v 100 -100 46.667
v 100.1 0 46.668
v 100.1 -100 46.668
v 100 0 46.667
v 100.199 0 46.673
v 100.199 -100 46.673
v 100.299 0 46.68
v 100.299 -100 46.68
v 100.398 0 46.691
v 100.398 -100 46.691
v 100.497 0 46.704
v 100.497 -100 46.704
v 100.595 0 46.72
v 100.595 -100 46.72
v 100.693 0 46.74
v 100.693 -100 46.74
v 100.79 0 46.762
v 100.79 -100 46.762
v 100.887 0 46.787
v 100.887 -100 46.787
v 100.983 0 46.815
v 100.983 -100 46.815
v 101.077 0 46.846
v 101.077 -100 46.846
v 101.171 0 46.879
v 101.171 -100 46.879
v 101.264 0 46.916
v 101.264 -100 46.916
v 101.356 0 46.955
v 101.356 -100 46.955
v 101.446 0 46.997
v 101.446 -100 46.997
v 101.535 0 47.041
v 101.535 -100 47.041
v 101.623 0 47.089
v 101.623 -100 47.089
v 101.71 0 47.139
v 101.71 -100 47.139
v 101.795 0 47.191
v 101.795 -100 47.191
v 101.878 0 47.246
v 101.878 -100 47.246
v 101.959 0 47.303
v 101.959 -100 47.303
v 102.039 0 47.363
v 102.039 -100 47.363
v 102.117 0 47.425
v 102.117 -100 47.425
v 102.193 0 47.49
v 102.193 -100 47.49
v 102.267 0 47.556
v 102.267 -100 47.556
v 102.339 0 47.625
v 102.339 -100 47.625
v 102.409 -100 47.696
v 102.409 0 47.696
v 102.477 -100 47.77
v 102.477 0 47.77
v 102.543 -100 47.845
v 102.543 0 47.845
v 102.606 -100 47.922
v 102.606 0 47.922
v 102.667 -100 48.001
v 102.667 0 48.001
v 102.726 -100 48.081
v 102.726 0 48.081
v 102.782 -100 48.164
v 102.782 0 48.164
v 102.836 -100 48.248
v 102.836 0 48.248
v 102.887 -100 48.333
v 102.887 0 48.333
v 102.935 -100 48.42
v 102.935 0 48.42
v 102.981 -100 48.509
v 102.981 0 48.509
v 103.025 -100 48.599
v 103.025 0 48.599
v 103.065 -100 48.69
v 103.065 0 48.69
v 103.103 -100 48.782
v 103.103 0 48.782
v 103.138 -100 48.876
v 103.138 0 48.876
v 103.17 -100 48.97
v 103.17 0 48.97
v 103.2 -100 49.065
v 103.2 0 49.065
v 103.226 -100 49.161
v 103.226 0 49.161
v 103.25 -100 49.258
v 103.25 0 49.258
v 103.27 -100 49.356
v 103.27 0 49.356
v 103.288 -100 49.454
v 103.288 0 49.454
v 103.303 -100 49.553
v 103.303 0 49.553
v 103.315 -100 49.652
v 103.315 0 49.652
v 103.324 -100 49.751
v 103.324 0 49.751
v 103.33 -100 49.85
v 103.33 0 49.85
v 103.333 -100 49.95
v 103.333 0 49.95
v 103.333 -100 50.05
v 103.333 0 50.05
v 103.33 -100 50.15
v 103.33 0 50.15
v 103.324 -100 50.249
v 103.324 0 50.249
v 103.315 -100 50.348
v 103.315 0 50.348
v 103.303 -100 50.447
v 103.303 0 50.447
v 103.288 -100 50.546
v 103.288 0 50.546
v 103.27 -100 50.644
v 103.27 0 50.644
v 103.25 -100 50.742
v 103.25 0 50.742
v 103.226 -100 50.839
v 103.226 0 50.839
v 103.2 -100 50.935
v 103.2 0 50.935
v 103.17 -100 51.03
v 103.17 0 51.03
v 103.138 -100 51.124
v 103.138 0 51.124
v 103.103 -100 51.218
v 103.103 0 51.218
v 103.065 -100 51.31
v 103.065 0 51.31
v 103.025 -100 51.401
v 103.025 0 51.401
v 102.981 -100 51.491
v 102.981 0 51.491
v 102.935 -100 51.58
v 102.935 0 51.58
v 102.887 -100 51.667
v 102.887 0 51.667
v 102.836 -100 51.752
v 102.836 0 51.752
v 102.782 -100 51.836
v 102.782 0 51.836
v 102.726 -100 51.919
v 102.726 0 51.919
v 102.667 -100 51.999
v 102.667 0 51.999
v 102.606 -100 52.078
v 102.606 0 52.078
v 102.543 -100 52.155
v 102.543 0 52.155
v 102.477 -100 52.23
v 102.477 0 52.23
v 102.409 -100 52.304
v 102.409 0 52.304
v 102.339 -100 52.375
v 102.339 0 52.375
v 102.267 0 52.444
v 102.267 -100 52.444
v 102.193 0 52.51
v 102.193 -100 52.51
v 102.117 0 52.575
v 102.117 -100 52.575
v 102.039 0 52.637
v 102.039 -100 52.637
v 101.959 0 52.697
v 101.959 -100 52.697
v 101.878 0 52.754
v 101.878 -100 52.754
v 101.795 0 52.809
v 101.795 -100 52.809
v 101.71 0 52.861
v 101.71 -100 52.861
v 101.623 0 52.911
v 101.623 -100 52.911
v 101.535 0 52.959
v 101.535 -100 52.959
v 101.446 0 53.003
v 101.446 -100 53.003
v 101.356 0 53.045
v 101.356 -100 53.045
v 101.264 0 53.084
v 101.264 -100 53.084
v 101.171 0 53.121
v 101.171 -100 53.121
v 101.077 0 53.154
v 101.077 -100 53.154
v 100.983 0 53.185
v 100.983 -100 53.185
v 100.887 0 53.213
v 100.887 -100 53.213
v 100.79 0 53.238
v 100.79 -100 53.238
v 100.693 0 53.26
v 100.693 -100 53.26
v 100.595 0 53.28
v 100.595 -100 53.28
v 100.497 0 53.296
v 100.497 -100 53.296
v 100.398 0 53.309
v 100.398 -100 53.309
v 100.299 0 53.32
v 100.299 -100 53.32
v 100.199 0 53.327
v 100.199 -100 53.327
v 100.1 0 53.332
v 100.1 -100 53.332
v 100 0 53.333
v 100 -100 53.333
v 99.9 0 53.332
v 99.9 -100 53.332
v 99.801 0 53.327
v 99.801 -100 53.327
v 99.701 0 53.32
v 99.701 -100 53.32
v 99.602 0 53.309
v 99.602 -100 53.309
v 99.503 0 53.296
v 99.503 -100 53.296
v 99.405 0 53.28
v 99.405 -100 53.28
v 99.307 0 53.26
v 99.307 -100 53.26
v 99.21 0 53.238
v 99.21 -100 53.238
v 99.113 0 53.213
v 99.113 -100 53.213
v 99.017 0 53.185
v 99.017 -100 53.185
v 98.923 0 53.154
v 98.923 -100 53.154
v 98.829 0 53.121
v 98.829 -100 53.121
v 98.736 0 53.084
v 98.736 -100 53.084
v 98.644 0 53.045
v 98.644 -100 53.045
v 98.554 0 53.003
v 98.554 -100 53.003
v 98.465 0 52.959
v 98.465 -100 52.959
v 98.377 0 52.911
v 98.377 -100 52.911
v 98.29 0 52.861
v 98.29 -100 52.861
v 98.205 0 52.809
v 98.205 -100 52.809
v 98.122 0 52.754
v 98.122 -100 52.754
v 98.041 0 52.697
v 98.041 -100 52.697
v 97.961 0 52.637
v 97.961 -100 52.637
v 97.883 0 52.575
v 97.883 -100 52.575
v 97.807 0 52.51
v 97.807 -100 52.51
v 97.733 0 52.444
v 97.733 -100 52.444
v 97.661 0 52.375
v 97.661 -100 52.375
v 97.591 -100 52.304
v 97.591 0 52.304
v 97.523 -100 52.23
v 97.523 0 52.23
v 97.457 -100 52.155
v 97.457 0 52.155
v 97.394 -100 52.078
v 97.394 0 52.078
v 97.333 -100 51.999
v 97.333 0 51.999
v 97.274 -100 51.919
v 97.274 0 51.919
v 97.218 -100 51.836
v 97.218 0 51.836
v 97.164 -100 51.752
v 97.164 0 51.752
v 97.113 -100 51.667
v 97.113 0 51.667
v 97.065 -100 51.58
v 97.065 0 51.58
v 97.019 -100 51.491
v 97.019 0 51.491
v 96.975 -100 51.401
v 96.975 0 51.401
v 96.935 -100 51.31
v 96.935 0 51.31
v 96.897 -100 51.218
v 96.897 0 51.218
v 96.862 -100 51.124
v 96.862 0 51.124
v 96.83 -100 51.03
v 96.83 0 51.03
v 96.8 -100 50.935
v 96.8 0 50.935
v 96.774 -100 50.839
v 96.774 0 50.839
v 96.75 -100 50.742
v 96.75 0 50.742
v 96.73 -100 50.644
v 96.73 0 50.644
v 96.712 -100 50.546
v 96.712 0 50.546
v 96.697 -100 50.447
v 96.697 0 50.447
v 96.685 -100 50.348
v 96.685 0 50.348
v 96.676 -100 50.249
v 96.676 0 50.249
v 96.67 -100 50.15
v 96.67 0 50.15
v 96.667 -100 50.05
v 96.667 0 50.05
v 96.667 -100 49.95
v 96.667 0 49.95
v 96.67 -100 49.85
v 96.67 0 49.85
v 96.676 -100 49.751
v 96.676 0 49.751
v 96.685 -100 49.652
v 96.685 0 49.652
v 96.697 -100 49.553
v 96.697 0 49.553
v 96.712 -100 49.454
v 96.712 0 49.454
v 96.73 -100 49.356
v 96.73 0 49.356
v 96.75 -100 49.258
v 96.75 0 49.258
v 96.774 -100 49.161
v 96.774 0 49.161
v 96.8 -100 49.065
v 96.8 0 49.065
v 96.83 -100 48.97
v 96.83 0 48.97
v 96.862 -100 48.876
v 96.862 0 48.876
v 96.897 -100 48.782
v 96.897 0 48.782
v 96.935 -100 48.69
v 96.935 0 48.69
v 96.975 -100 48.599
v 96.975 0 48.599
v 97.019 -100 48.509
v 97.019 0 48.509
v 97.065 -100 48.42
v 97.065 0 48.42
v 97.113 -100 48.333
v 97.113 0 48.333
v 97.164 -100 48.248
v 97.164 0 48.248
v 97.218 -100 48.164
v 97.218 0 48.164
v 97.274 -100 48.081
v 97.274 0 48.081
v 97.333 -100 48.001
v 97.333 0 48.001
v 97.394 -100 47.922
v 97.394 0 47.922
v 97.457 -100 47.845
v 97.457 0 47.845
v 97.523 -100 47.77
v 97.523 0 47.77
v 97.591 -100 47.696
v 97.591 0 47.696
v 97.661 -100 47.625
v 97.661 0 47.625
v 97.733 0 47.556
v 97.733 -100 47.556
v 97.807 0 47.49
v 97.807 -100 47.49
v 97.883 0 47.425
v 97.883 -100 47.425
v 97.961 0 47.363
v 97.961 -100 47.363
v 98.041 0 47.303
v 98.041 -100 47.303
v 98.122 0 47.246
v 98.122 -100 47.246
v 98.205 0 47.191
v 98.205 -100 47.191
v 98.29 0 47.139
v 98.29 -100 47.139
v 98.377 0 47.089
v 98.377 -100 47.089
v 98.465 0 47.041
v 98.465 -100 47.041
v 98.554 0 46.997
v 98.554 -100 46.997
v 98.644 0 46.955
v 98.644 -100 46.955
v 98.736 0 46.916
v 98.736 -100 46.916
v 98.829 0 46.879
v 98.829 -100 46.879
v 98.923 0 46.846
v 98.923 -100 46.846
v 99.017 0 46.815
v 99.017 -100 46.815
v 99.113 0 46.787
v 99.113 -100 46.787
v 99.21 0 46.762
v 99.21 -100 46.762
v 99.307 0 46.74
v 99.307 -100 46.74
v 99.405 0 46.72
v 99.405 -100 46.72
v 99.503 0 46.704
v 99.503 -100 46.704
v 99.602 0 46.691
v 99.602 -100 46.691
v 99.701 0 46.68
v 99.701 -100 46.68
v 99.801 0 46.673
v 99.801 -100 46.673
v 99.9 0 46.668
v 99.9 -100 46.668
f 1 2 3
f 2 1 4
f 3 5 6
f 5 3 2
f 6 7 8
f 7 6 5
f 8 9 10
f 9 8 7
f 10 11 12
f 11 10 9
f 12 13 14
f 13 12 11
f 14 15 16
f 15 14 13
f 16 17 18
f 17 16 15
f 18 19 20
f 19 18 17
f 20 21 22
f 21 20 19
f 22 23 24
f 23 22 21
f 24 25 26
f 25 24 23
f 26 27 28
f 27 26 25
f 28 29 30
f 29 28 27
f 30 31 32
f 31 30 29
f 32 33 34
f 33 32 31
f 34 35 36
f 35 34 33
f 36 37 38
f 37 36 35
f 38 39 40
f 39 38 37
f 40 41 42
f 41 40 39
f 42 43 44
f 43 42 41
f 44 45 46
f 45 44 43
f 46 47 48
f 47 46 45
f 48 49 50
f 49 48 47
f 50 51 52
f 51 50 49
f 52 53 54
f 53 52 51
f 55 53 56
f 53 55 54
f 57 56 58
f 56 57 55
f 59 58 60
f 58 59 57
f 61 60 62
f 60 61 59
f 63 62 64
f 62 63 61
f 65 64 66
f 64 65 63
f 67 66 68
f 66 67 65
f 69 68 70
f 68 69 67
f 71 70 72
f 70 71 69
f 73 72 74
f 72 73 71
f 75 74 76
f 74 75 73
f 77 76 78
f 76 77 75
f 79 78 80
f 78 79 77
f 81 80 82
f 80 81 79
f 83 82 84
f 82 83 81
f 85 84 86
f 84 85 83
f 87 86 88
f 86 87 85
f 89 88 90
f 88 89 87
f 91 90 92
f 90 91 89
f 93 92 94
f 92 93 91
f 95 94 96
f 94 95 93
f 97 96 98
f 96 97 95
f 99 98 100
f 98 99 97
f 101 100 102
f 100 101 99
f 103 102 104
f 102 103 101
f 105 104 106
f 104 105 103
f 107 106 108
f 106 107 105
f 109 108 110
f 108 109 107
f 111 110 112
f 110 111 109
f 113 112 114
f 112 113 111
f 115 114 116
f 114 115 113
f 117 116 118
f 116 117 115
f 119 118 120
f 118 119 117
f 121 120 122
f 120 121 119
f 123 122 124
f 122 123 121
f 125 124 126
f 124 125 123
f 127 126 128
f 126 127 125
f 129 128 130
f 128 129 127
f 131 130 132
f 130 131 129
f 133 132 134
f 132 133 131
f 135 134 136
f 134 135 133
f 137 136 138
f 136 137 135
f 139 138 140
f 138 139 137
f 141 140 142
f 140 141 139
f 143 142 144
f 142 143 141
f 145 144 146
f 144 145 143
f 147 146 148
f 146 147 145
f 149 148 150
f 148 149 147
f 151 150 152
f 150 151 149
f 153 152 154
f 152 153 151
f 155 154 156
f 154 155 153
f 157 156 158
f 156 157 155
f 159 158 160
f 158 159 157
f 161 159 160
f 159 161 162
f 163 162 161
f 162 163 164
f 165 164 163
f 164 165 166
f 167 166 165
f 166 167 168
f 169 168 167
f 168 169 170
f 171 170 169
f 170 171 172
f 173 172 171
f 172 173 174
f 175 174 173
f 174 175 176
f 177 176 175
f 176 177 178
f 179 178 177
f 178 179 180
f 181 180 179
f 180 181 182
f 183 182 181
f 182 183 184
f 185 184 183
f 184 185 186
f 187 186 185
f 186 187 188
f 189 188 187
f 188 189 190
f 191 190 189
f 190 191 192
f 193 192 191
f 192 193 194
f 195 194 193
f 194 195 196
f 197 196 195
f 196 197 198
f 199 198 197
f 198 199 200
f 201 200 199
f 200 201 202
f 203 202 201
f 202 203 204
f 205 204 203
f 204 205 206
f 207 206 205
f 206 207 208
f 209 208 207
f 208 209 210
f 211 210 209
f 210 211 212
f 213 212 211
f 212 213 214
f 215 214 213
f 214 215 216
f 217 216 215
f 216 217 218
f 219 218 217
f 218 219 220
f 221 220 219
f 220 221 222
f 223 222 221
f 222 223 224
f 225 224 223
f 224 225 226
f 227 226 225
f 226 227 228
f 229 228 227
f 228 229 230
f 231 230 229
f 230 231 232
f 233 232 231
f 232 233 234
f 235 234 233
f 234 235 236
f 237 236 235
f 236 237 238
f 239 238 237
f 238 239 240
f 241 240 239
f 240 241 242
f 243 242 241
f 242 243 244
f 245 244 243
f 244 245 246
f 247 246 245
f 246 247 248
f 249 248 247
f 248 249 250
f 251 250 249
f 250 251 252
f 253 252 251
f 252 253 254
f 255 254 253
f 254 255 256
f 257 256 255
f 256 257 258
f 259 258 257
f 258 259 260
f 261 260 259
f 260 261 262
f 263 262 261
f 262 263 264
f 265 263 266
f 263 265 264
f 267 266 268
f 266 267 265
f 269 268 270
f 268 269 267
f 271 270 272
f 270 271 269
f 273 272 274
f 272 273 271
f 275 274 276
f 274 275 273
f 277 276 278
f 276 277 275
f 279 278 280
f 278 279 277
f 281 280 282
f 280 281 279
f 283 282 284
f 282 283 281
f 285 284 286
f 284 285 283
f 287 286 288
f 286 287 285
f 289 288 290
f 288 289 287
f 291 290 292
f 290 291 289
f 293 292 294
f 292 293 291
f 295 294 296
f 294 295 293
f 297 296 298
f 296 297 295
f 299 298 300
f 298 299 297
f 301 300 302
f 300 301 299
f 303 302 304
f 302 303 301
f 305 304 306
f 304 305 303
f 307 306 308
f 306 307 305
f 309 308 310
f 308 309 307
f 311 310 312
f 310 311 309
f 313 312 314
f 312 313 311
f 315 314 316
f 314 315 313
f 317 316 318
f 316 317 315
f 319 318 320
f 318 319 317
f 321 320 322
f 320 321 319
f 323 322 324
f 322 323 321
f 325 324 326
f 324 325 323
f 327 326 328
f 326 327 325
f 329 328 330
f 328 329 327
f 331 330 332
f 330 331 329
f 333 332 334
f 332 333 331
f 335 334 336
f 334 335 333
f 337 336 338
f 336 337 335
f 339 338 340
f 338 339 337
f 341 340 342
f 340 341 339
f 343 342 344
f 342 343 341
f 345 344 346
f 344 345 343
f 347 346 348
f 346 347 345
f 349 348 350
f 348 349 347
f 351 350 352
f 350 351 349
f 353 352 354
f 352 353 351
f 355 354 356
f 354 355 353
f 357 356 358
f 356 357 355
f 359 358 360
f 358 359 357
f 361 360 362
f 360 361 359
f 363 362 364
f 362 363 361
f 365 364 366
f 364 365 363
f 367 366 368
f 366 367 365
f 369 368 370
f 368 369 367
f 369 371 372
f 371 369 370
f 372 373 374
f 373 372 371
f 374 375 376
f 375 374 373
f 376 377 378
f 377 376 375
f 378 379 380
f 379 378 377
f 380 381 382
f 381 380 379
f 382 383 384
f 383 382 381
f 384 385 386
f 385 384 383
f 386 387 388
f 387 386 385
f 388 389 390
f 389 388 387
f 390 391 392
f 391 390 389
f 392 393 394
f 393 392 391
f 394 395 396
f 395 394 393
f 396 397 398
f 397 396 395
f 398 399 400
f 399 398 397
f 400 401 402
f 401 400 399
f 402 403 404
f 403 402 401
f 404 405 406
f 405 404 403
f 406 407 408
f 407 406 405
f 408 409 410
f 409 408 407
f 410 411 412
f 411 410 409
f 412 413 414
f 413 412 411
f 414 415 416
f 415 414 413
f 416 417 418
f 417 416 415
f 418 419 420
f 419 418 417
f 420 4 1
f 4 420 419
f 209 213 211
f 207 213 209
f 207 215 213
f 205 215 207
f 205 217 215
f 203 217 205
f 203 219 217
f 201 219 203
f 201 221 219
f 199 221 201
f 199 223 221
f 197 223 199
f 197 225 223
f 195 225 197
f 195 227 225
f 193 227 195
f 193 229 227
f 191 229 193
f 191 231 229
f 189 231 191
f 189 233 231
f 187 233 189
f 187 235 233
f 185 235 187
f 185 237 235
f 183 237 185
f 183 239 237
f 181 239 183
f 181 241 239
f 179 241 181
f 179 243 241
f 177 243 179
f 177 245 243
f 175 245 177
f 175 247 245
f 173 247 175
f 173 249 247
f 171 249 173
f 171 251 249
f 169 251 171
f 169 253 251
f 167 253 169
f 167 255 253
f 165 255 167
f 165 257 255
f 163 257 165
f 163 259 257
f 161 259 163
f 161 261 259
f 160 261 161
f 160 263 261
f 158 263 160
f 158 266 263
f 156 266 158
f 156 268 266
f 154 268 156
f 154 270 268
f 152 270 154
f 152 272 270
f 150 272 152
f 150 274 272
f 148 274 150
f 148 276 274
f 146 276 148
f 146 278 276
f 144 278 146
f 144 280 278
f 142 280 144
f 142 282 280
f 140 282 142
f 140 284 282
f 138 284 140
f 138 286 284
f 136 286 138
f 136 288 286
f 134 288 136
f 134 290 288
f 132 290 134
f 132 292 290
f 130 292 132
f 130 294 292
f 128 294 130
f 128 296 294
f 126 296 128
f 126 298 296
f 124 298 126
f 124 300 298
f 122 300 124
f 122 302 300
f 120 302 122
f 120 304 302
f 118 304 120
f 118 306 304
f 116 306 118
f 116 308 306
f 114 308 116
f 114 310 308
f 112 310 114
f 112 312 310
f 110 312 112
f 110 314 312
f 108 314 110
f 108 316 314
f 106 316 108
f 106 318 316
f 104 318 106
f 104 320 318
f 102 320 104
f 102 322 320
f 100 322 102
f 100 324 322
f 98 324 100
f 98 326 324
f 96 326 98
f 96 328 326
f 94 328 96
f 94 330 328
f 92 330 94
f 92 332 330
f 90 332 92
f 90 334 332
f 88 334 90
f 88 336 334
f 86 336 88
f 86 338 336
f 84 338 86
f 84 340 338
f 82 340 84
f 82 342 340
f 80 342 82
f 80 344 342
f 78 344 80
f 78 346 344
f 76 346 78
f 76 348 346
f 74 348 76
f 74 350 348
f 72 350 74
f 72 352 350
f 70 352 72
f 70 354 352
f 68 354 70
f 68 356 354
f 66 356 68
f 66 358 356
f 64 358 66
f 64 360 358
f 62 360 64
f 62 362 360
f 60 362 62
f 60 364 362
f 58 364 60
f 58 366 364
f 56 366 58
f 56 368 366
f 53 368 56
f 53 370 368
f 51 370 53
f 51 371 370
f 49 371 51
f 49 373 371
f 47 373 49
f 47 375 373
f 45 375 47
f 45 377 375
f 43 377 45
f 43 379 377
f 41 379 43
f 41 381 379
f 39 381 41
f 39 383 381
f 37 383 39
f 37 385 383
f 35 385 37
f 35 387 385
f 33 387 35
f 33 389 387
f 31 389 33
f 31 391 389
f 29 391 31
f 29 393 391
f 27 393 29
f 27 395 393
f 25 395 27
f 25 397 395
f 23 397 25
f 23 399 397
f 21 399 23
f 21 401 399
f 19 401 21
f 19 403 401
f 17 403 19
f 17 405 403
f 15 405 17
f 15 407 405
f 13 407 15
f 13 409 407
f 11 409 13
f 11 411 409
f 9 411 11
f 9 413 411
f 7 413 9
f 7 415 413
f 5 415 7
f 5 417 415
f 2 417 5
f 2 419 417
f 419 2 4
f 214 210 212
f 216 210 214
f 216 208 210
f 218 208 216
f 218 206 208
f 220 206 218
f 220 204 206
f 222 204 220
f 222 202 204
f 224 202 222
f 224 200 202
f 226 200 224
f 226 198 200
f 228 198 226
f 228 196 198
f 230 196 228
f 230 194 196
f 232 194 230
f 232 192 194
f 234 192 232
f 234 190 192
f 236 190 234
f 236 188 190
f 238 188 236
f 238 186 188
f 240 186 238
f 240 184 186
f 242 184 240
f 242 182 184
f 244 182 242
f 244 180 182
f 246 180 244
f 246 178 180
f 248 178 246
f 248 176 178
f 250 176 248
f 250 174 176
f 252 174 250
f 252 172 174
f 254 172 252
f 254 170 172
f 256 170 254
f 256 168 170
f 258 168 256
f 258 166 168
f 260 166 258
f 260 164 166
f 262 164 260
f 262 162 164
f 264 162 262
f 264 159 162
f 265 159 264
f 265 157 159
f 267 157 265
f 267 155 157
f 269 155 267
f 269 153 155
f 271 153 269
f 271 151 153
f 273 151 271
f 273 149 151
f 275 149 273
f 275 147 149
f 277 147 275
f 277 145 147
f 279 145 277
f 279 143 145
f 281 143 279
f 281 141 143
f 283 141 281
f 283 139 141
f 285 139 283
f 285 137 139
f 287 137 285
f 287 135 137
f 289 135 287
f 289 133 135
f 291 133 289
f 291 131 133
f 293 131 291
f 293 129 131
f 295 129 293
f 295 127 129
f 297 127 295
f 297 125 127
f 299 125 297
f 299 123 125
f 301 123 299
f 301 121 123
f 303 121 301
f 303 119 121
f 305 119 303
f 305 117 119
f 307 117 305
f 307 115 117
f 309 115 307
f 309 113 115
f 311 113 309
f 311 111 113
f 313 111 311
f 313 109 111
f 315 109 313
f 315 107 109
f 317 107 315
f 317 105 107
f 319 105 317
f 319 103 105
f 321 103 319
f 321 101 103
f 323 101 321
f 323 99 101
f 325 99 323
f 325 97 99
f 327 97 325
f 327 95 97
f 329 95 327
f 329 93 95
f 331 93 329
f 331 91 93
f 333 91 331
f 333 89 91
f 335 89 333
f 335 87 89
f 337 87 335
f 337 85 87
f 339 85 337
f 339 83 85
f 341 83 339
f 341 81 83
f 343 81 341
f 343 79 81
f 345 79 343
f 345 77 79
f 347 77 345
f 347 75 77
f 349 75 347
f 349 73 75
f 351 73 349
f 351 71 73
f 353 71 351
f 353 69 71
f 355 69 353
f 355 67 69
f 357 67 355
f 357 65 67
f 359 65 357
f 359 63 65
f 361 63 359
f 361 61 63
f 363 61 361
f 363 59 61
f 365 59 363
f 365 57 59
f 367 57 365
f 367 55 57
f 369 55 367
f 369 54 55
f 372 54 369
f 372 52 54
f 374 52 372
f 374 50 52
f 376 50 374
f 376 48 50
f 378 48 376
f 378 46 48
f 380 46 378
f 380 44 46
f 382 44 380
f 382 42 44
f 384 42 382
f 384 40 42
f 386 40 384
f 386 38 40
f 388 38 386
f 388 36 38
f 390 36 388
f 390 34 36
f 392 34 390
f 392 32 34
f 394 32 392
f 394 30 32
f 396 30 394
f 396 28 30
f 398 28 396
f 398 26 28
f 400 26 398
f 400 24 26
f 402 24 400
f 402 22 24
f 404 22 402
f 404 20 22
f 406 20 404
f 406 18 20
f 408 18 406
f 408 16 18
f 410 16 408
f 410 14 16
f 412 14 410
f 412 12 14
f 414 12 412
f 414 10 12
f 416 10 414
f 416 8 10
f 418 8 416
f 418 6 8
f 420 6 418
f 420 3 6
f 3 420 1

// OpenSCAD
// file: Part-Constants.scad
// PART CONSTANT Configuration File
//  last modified June 8 2021 by SrAmo

// conversions
mm_inch = 1/25.4;

// 1/4 ID bearing OD if using a bearing (PART FR4-ZZ C3)
bearing_od=15.9512; // 0.628 inch = 15.9512 mm
// 1/4 ID bearing flange OD (with clearance)
bearing_flange_od=18.034; // .71 inch = 18.034 mm
// 1/4 ID bearing flange thickness
bearing_flange_t=1.27; // 0.05 inch = 1.27 mm
// 1/4 ID bearing thickness (under the flange)
bearing_t=3.937; // 0.155 inch = 3.937 mm

// round belt diameter throughout, if used
//belt_d=4.826;   // 0.19 in = 4.826 mm

// hole for 0.25 inch joint/bolt
hole_p25_inch=6.477;   // 0.255 inch = 6.477 mm
// hole start diameter for number 6 screw
hole_no6_screw = 2.413; // 0.095 inch = 2.413
// hole for M3 (3 mm) joint/bolt
hole_M3=3.1;  // inch
// hole for M5 (5 mm) joint/bolt
hole_M5=5.1;  // inch
// hole for servo bushing
hole_servo_bushing=3.81;   // 0.15 inch = 3.81 mm

// STANDARD 40MM X 20MM X 40MM SERVO DIMENSIONS
// Servo Length for openings in parts
svo_l = 40.66; 
// Servo Width for openings in parts
svo_w = 20.3;
// Servo Depth from Horn interface to bottom of part
svo_d = 42;
// Servo dist from shaft to edge of body in length direction
svo_shaft = 10.2;
// Servo screw hole length between
svo_screw_l = 49.5;
// Servo screw hole width between
svo_screw_w = 10;
// Servo flange length
svo_flange_l = 55;
// Servo flange thickness
svo_flange_t = 3;
// Servo depth from Horn interface to top of flange
svo_flange_d = 10;

GT2pulleyd = 12;
GT2pulleyt = 8.5;
// file: Pulley-GT2_2.scad
// Parametric Pulley for GT2-2 belt profiles
// by droftarts January 2012
// Modified to parametric GT2-2 module by SrAmo May-Aug 2020
// Based on pulleys by:
// http://www.thingiverse.com/thing:11256 by me!
// https://github.com/prusajr/PrusaMendel by Josef Prusa
// http://www.thingiverse.com/thing:3104 by GilesBathgate
// http://www.thingiverse.com/thing:2079 by nophead

// dxf tooth data from http://oem.cadregister.com/asp/PPOW_Entry.asp?company=915217&elementID=07807803/METRIC/URETH/WV0025/F
// pulley diameter checked and modelled from data at http://www.sdp-si.com/D265/HTML/D265T016.html

// number of teeth for display
display_teeth = 30;
// pulley
display_pulley = true;
// belt
display_belt = true;
// section cut
perform_section_cut = false;

// tuneable constants
//retainer = 1;		// Belt retainer above teeth, 0 = No, 1 = Yes
retainer_ht = 1.;	// height of retainer flange, part of pulley_t_ht
//idler = 1;			// Belt retainer below teeth, 0 = No, 1 = Yes
idler_ht = 1.;		// height of idler flange, part of pulley_t_ht

//	********************************
//	** Scaling tooth for good fit **
//	********************************
/*	To improve fit of belt to pulley, set the following constant. Decrease or increase by 0.1mm at a time. We are modelling the *BELT* tooth here, not the tooth on the pulley. Increasing the number will *decrease* the pulley tooth size. Increasing the tooth width will also scale proportionately the tooth depth, to maintain the shape of the tooth, and increase how far into the pulley the tooth is indented. Can be negative */

//difference () {
    
if (display_pulley) {
    difference () {
        pulley_gt2_2 ( teeth = display_teeth , pulley_t_ht = 10 ,motor_shaft=10 );

        if (perform_section_cut)
            translate ([0,0,55]) cube (100,center=true);
        }
    }

if (display_belt) {
    difference () {
        translate ([0,0,2]) 
            belt_circle(teeth=display_teeth,ht=6,thk=1.1);
        if (perform_section_cut)
            translate ([0,0,55.5]) cube (100,center=true);
        }
    }

// Functions

function tooth_spaceing_curvefit (teeth,b,c,d)
	= ((c * pow(teeth,d)) / (b + pow(teeth,d))) * teeth ;

function tooth_spacing(teeth,tooth_pitch,pitch_line_offset)
	= (2*((teeth*tooth_pitch)/(3.14159265*2)-pitch_line_offset)) ;

module belt_circle ( teeth=100, ht=5, thk = 1,tooth_depth=0.764 ,tooth_width=1.494){
    
    // for pulley 0.2, for belt -0.1 mm
    additional_tooth_width = -0.1; //mm
    
    //	If you need more tooth depth than this provides, adjust the following constant. However, this will cause the shape of the tooth to change.
    // for pulley 0, for belt 0 mm
    additional_tooth_depth = 0.0; //mm
        
    diam_mm = teeth*2/PI;
    echo(diam_mm=diam_mm);
    diam_inch = diam_mm/25.4;
    echo(diam_inch=diam_inch);
    
    pulley_OD = tooth_spacing (teeth,2,0.254);
    
	tooth_distance_from_centre = sqrt( pow(pulley_OD/2,2) - pow((tooth_width+additional_tooth_width)/2,2));
    
	tooth_width_scale = (tooth_width + additional_tooth_width ) / tooth_width;
	tooth_depth_scale = ((tooth_depth + additional_tooth_depth ) / tooth_depth) ;

    difference () {
        cylinder(h=ht,d=(diam_mm+2*thk),center=false,$fa=2);
        translate([0,0,-ht/4])
		linear_extrude(ht*2)
        difference()
			{
			//outside diameter of pulley
			translate([0,0,0]) 
			rotate ([0,0,360/(teeth*4)]) 
			//cylinder(r=pulley_OD/2,h=ht*2, $fa=2);
			circle(r=pulley_OD/2,$fa=2);
	
			//teeth - cut out of cylinder
			for(i=[1:teeth]) 
			rotate([0,0,i*(360/teeth)])
			translate([0,-tooth_distance_from_centre,-1]) 
			scale ([ tooth_width_scale , tooth_depth_scale , 1 ])  
                GT2_2mm(pulley_t_ht=ht*2);
			}

    }
}
// Main Module

module pulley_gt2_2( teeth = 40 , pulley_t_ht = 10, motor_shaft = 5.2, tooth_depth=0.764 , tooth_width=1.494 ,retainer=1,idler=1)
	{

    // for pulley 0.2, for belt -0.2 mm
    additional_tooth_width = 0.1; //mm
    
    //	If you need more tooth depth than this provides, adjust the following constant. However, this will cause the shape of the tooth to change.
    // for pulley 0, for belt 0 mm
    additional_tooth_depth = 0; //mm
        
    // calculated constants
    
    // The following set the pulley diameter for a given number of teeth
    pulley_OD = tooth_spacing (teeth,2,0.254);

	tooth_distance_from_centre = sqrt( pow(pulley_OD/2,2) - pow((tooth_width+additional_tooth_width)/2,2));
	tooth_width_scale = (tooth_width + additional_tooth_width ) / tooth_width;
	tooth_depth_scale = ((tooth_depth + additional_tooth_depth ) / tooth_depth) ;

	difference()
	 {	 
		union()
		{
			linear_extrude(pulley_t_ht)
            difference()
			{
			//shaft - diameter is outside diameter of pulley
			
			translate([0,0,0]) 
			rotate ([0,0,360/(teeth*4)]) 
            circle(r=pulley_OD/2);
			//cylinder(r=pulley_OD/2,h=pulley_t_ht, $fa=2);
	
			//teeth - cut out of shaft
		
			for(i=[1:teeth]) 
			rotate([0,0,i*(360/teeth)])
			translate([0,-tooth_distance_from_centre,-1]) 
			scale ([ tooth_width_scale , tooth_depth_scale , 1 ])  
                GT2_2mm(pulley_t_ht=pulley_t_ht);
			}
			
		//belt retainer / idler
		if ( retainer > 0 ) {translate ([0,0, pulley_t_ht-retainer_ht ]) 
		rotate_extrude($fa=2)  
		//polygon([[0,0],[pulley_OD/2,0],[pulley_OD/2 + retainer_ht , retainer_ht],[0 , retainer_ht],[0,0]]);}
		polygon([[0,-retainer_ht],[pulley_OD/2-retainer_ht,-retainer_ht],[pulley_OD/2 + retainer_ht , retainer_ht],[0 , retainer_ht],[0,-retainer_ht]]);}		
        
		if ( idler > 0 ) {translate ([0,0, 0 ]) 
		rotate_extrude($fa=2)  
		//polygon([[0,0],[pulley_OD/2 + idler_ht,0],[pulley_OD/2 , idler_ht],[0 , idler_ht],[0,0]]);}
        polygon([[0,0],[pulley_OD/2 + idler_ht,0],[pulley_OD/2-idler_ht , 2*idler_ht],[0 , 2*idler_ht],[0,0]]);}
		}
	   
		//hole for motor shaft
		translate([0,0,-1])
            cylinder(r=motor_shaft/2,h= pulley_t_ht + retainer_ht + 2,$fa=1,$fs=1);
				
	 }
	   
	}


// Tooth profile modules

module GT2_2mm(pulley_t_ht=6)
	{
	/*linear_extrude(height=pulley_t_ht+2) */ polygon([[0.747183,-0.5],[0.747183,0],[0.647876,0.037218],[0.598311,0.130528],[0.578556,0.238423],[0.547158,0.343077],[0.504649,0.443762],[0.451556,0.53975],[0.358229,0.636924],[0.2484,0.707276],[0.127259,0.750044],[0,0.76447],[-0.127259,0.750044],[-0.2484,0.707276],[-0.358229,0.636924],[-0.451556,0.53975],[-0.504797,0.443762],[-0.547291,0.343077],[-0.578605,0.238423],[-0.598311,0.130528],[-0.648009,0.037218],[-0.747183,0],[-0.747183,-0.5]]);
	}
// main file
// Force, Torque, Spring Module and Function Library
//  Started on 4/6/2020 by SrAmo
//  last modified 7/22/2021 by SrAmo
/*  >>>>> Introduction <<<<<

    The purpose of this library is to:
    1) Create 3D Force display module
    2) Create 3D Torque display module (2d works, 3d not yet)
    3) Function for distance from point to line
*/
use <Robot_Arm_Parts_lib.scad>
// Force or Torque magnitude for testing modules
mag = 1; // [-40:0.2:40]
// Display force arrows
display_force = false; 
// Display torque arrow
display_torque = false;

// test array
e=[[2,3,4],[1,2,3],[0,0,1]];
echo(norm(e[0]),norm(e[1]),norm(e[2]));
echo(cross([1,0,0],[0,0,1]));
echo(e[1],rotZ_pt(90,e[1]));

echo(dist_line_pt());

if (display_force) force_arrow([0,0,0],[1,0,0],mag=mag);
if (display_force) force_arrow([0,0,0],[0,-1,0],mag=mag);
if (display_force) force_arrow([0,0,0],[0,0,1],mag=-mag); // note neg mag

if (display_force) color ("blue") force_arrow([2,2,2],[1,1,0],mag=mag);
if (display_force) color ("green") force_arrow([2,2,2],[0,1,1],mag=mag);
if (display_force) force_arrow([2,2,2],[1,0,1],mag=mag);

if (display_torque) torque_arrow([0,0,0],mag=mag);
if (display_torque) torque_arrow([0,0,5],mag=-mag);

// linear interpolation function
// Returns the value between A and B given t between t_l and t_h
function linear_interp (A,B,t,t_l,t_h) = (A+((t-t_l)/(t_h-t_l))*(B-A));

// distance from 0,0 to line function
//  reference Wikipedia "distance from a point to a line"
//  see formula for line defined by two points
//  when the point is 0,0 the formula is simple
// line is defined by two points p1 and p2
function dist_line_origin (p1=[1,1],p2=[0,2])=
(p2[0]*p1[1]-p2[1]*p1[0])/norm([(p1[0]-p2[0]),(p1[1]-p2[1]),0]);

function dist_line_pt (p1=[-5,5,0],p2=[0,5,0],pt=[10,0,0])=
// removed abs
((p2[1]-p1[1])*pt[0]-(p2[0]-p1[0])*pt[1]+p2[0]*p1[1]-p2[1]*p1[0])/norm([(p1[0]-p2[0]),(p1[1]-p2[1]),0]);

function rotZ_pt (a=10,p=[1,1,0]) = ([(p[0]*cos(a)+p[1]*sin(a)),(p[1]*cos(a)+p[0]*sin(a)),p[2]]);

module plot_circle(rad=2,n=10,dot_r=2,center=[0,0,0]) {
    // plots a circle of radius rad, at center, in n steps
    
    $fn = $preview ? 12 : 24;     // number of fragments
    
    for (i=[0:360/n:360]){
        // draw a small circle at each point
        translate([ (center[0]+rad*cos(i)),
        (center[1]+rad*sin(i))])      
        circle(dot_r);       
    };
}
// recursive module that draws a 3D point list
//   An optional value list can be provided and the height of the
//   cylinders will be set to the corresponding value in the list.
module draw_3d_list(the3dlist=[],size=10,dot_color="blue",value=[],idx=0) {
    point=the3dlist[idx];
    height=value[idx];
    //echo(point=point);
    if (point != undef) { // not undefined means there is a point
        if (height != undef) {
           color(dot_color) translate(point) translate([0,0,height/2]) cylinder(h=abs(height),r=size,center=true);   
        } else {
            color(dot_color) translate(point) cylinder(h=10,r=size,center=true);   
        }
       idx=idx+1;
       draw_3d_list(the3dlist,size,dot_color,value,idx);
    }  
    // Note: that an undefined causes the recursion to stop
}

module Margin_Safety(min,max,allowable,name="THING NAME") {
    // calculate Engineering Margin of Safety for "thing"
    // Two actual values can be provided, representing most negative and most pos
    // allowable = the allowable value
    // Move this module to the force library
    MAX = max(abs(max),abs(min));
    MS = (allowable/MAX)-1;
    echo(name," MARGIN OF SAFETY ",MS=MS,MAX=MAX);
}

module force_arrow(from=[1,1,0],vec=[1,0,0],mag=10) {
    // draw a 3D force of length (mag), at (from), direction (vec)
    //
    $fn = $preview ? 10 : 20;     // number of fragments
    if (norm(vec)>0.001) {  // check for non zero vector
        
        dx = -vec[0];
        dy = -vec[1];
        dz = -vec[2];
        
        // "cylinder" is centered around z axis
        // These are angles needed to rotate to correct direction
        ay = 90 - atan2(dz, sqrt(dx*dx + dy*dy));
        az = atan2(dy, dx);
        angles = [0, ay, az];
        
        d = abs(mag); // used to scale arrow
        sclr=d*.05; // scaler for arrow shaft
        
        if (abs(mag)>0.1) { // don't draw if small
            color("red") 
            translate (from) 
            rotate (angles) 
            translate([0,0,-d])
            union () {
                translate([0,0,d*.1])
                    cylinder(d*.9,d1=sclr,d2=sclr,false);
                cylinder(d*.2,0,d*.1,false);
            }
        } else {
            echo("MODULE FORCE_ARROW; small mag = ",mag);
    }
    } else {
        echo("MODULE FORCE_ARROW; vec too small = ",vec);
    }
}
module torque_arrow(to=[10,4,0],mag=10) {
    // draw a torque of diameter abs(mag), at to point
    // assumes torque is on x,y plane (for now)
    // arrowhead changes direction with sign of mag
    //
    $fn = $preview ? 20 : 72;     // number of fragments
    d = abs(mag); // used to scale arrow
    sclr=d*.025; // scaler for arrow shaft
    if (abs(mag)>0.1) {
        // "cylinder" is centered around z axis
        // first rotate so that it is around x axis
        // then rotate about z to point in vector location
        color("blue") 
        translate (to) 
        rotate_extrude(angle=270,convexity = 10) 
        translate([abs(mag/2), 0, 0]) 
        circle(r = sclr);
        if (mag>0) { // positive arrowhead
            color("blue") 
            translate ([to[0]+d*.2,to[1]-mag/2,to[2]]) 
            rotate([0,-90,0]) 
            cylinder(d*.2,0,d*.1,false);
        } else { // negative arrowhead
            color("blue") 
            translate ([to[0]-mag/2,to[1]-d*.2,to[2]]) 
            rotate([-90,0,0]) 
            cylinder(d*.2,0,d*.1,false);
        }
    } else {
        echo("MODULE TORQUE_ARROW; small mag = ",mag);
    }
}

// return the torque given a rotation theta of a torsion spring of strength K
function torsion_spr_torque(K,theta,theta_zero) =
    K*(theta-theta_zero);

// Calculate the torque about a joint ptj caused by a pt1-pt2 spring
// of spring constant K and free length freelen
function spring_torque(pt1=[10,0,0],pt2=[10,10,0],ptj=[-10,0,0],K=1,freelen=1) = 
    let (arm = dist_line_pt(pt1,pt2,ptj)) // dist_line_pt in force_lib
    let (sprlen = norm(pt1-pt2)) 
    K * (sprlen-freelen) * arm;  // the torque calculation

sprtest = spring_torque();  // test
echo(sprtest=sprtest);

// convert number into a red to green value
function val_red(i) = i < 3 ? 0 : i < 4 ? 0.25 : i < 5 ? 0.5 : 1 ;
function val_green(i) = i < 3 ? 1 : i < 4 ? 0.75 : i < 5 ? 0.5 : 0;

// Draw a spring cylinder from pt1-pt2 
// of spring constant K and free length freelen
// and color it based on the percent elongation
module draw_spring(pt1=[100,0,50],pt2=[100,100,50],freelen=10) {
    sprlen = norm(pt1-pt2); 
    pct_elong = (sprlen-freelen)/freelen-1; 
    sprd = norm(pt1-pt2)/15; // spring diameter for display only
    echo(pct_elong=pct_elong*100,sprd=sprd);
    color ([val_red(pct_elong),val_green(pct_elong),0.1])
        pt_pt_cylinder(from=pt1, to=pt2, d=sprd);
}
draw_spring();

// vector subtract function ## Just use V1 - V2 ##
//function vector_subtract(a=[1,1,1],b=[-1,1,-1]) =[(b[0]-a[0]),(b[1]-a[1]),(b[2]-a[2])];

// vector addition function ## Just use V1 + V2 ##
//function vector_add(a=[1,1,1],b=[-1,1,-1]) = [(b[0]+a[0]),(b[1]+a[1]),(b[2]+a[2])];
